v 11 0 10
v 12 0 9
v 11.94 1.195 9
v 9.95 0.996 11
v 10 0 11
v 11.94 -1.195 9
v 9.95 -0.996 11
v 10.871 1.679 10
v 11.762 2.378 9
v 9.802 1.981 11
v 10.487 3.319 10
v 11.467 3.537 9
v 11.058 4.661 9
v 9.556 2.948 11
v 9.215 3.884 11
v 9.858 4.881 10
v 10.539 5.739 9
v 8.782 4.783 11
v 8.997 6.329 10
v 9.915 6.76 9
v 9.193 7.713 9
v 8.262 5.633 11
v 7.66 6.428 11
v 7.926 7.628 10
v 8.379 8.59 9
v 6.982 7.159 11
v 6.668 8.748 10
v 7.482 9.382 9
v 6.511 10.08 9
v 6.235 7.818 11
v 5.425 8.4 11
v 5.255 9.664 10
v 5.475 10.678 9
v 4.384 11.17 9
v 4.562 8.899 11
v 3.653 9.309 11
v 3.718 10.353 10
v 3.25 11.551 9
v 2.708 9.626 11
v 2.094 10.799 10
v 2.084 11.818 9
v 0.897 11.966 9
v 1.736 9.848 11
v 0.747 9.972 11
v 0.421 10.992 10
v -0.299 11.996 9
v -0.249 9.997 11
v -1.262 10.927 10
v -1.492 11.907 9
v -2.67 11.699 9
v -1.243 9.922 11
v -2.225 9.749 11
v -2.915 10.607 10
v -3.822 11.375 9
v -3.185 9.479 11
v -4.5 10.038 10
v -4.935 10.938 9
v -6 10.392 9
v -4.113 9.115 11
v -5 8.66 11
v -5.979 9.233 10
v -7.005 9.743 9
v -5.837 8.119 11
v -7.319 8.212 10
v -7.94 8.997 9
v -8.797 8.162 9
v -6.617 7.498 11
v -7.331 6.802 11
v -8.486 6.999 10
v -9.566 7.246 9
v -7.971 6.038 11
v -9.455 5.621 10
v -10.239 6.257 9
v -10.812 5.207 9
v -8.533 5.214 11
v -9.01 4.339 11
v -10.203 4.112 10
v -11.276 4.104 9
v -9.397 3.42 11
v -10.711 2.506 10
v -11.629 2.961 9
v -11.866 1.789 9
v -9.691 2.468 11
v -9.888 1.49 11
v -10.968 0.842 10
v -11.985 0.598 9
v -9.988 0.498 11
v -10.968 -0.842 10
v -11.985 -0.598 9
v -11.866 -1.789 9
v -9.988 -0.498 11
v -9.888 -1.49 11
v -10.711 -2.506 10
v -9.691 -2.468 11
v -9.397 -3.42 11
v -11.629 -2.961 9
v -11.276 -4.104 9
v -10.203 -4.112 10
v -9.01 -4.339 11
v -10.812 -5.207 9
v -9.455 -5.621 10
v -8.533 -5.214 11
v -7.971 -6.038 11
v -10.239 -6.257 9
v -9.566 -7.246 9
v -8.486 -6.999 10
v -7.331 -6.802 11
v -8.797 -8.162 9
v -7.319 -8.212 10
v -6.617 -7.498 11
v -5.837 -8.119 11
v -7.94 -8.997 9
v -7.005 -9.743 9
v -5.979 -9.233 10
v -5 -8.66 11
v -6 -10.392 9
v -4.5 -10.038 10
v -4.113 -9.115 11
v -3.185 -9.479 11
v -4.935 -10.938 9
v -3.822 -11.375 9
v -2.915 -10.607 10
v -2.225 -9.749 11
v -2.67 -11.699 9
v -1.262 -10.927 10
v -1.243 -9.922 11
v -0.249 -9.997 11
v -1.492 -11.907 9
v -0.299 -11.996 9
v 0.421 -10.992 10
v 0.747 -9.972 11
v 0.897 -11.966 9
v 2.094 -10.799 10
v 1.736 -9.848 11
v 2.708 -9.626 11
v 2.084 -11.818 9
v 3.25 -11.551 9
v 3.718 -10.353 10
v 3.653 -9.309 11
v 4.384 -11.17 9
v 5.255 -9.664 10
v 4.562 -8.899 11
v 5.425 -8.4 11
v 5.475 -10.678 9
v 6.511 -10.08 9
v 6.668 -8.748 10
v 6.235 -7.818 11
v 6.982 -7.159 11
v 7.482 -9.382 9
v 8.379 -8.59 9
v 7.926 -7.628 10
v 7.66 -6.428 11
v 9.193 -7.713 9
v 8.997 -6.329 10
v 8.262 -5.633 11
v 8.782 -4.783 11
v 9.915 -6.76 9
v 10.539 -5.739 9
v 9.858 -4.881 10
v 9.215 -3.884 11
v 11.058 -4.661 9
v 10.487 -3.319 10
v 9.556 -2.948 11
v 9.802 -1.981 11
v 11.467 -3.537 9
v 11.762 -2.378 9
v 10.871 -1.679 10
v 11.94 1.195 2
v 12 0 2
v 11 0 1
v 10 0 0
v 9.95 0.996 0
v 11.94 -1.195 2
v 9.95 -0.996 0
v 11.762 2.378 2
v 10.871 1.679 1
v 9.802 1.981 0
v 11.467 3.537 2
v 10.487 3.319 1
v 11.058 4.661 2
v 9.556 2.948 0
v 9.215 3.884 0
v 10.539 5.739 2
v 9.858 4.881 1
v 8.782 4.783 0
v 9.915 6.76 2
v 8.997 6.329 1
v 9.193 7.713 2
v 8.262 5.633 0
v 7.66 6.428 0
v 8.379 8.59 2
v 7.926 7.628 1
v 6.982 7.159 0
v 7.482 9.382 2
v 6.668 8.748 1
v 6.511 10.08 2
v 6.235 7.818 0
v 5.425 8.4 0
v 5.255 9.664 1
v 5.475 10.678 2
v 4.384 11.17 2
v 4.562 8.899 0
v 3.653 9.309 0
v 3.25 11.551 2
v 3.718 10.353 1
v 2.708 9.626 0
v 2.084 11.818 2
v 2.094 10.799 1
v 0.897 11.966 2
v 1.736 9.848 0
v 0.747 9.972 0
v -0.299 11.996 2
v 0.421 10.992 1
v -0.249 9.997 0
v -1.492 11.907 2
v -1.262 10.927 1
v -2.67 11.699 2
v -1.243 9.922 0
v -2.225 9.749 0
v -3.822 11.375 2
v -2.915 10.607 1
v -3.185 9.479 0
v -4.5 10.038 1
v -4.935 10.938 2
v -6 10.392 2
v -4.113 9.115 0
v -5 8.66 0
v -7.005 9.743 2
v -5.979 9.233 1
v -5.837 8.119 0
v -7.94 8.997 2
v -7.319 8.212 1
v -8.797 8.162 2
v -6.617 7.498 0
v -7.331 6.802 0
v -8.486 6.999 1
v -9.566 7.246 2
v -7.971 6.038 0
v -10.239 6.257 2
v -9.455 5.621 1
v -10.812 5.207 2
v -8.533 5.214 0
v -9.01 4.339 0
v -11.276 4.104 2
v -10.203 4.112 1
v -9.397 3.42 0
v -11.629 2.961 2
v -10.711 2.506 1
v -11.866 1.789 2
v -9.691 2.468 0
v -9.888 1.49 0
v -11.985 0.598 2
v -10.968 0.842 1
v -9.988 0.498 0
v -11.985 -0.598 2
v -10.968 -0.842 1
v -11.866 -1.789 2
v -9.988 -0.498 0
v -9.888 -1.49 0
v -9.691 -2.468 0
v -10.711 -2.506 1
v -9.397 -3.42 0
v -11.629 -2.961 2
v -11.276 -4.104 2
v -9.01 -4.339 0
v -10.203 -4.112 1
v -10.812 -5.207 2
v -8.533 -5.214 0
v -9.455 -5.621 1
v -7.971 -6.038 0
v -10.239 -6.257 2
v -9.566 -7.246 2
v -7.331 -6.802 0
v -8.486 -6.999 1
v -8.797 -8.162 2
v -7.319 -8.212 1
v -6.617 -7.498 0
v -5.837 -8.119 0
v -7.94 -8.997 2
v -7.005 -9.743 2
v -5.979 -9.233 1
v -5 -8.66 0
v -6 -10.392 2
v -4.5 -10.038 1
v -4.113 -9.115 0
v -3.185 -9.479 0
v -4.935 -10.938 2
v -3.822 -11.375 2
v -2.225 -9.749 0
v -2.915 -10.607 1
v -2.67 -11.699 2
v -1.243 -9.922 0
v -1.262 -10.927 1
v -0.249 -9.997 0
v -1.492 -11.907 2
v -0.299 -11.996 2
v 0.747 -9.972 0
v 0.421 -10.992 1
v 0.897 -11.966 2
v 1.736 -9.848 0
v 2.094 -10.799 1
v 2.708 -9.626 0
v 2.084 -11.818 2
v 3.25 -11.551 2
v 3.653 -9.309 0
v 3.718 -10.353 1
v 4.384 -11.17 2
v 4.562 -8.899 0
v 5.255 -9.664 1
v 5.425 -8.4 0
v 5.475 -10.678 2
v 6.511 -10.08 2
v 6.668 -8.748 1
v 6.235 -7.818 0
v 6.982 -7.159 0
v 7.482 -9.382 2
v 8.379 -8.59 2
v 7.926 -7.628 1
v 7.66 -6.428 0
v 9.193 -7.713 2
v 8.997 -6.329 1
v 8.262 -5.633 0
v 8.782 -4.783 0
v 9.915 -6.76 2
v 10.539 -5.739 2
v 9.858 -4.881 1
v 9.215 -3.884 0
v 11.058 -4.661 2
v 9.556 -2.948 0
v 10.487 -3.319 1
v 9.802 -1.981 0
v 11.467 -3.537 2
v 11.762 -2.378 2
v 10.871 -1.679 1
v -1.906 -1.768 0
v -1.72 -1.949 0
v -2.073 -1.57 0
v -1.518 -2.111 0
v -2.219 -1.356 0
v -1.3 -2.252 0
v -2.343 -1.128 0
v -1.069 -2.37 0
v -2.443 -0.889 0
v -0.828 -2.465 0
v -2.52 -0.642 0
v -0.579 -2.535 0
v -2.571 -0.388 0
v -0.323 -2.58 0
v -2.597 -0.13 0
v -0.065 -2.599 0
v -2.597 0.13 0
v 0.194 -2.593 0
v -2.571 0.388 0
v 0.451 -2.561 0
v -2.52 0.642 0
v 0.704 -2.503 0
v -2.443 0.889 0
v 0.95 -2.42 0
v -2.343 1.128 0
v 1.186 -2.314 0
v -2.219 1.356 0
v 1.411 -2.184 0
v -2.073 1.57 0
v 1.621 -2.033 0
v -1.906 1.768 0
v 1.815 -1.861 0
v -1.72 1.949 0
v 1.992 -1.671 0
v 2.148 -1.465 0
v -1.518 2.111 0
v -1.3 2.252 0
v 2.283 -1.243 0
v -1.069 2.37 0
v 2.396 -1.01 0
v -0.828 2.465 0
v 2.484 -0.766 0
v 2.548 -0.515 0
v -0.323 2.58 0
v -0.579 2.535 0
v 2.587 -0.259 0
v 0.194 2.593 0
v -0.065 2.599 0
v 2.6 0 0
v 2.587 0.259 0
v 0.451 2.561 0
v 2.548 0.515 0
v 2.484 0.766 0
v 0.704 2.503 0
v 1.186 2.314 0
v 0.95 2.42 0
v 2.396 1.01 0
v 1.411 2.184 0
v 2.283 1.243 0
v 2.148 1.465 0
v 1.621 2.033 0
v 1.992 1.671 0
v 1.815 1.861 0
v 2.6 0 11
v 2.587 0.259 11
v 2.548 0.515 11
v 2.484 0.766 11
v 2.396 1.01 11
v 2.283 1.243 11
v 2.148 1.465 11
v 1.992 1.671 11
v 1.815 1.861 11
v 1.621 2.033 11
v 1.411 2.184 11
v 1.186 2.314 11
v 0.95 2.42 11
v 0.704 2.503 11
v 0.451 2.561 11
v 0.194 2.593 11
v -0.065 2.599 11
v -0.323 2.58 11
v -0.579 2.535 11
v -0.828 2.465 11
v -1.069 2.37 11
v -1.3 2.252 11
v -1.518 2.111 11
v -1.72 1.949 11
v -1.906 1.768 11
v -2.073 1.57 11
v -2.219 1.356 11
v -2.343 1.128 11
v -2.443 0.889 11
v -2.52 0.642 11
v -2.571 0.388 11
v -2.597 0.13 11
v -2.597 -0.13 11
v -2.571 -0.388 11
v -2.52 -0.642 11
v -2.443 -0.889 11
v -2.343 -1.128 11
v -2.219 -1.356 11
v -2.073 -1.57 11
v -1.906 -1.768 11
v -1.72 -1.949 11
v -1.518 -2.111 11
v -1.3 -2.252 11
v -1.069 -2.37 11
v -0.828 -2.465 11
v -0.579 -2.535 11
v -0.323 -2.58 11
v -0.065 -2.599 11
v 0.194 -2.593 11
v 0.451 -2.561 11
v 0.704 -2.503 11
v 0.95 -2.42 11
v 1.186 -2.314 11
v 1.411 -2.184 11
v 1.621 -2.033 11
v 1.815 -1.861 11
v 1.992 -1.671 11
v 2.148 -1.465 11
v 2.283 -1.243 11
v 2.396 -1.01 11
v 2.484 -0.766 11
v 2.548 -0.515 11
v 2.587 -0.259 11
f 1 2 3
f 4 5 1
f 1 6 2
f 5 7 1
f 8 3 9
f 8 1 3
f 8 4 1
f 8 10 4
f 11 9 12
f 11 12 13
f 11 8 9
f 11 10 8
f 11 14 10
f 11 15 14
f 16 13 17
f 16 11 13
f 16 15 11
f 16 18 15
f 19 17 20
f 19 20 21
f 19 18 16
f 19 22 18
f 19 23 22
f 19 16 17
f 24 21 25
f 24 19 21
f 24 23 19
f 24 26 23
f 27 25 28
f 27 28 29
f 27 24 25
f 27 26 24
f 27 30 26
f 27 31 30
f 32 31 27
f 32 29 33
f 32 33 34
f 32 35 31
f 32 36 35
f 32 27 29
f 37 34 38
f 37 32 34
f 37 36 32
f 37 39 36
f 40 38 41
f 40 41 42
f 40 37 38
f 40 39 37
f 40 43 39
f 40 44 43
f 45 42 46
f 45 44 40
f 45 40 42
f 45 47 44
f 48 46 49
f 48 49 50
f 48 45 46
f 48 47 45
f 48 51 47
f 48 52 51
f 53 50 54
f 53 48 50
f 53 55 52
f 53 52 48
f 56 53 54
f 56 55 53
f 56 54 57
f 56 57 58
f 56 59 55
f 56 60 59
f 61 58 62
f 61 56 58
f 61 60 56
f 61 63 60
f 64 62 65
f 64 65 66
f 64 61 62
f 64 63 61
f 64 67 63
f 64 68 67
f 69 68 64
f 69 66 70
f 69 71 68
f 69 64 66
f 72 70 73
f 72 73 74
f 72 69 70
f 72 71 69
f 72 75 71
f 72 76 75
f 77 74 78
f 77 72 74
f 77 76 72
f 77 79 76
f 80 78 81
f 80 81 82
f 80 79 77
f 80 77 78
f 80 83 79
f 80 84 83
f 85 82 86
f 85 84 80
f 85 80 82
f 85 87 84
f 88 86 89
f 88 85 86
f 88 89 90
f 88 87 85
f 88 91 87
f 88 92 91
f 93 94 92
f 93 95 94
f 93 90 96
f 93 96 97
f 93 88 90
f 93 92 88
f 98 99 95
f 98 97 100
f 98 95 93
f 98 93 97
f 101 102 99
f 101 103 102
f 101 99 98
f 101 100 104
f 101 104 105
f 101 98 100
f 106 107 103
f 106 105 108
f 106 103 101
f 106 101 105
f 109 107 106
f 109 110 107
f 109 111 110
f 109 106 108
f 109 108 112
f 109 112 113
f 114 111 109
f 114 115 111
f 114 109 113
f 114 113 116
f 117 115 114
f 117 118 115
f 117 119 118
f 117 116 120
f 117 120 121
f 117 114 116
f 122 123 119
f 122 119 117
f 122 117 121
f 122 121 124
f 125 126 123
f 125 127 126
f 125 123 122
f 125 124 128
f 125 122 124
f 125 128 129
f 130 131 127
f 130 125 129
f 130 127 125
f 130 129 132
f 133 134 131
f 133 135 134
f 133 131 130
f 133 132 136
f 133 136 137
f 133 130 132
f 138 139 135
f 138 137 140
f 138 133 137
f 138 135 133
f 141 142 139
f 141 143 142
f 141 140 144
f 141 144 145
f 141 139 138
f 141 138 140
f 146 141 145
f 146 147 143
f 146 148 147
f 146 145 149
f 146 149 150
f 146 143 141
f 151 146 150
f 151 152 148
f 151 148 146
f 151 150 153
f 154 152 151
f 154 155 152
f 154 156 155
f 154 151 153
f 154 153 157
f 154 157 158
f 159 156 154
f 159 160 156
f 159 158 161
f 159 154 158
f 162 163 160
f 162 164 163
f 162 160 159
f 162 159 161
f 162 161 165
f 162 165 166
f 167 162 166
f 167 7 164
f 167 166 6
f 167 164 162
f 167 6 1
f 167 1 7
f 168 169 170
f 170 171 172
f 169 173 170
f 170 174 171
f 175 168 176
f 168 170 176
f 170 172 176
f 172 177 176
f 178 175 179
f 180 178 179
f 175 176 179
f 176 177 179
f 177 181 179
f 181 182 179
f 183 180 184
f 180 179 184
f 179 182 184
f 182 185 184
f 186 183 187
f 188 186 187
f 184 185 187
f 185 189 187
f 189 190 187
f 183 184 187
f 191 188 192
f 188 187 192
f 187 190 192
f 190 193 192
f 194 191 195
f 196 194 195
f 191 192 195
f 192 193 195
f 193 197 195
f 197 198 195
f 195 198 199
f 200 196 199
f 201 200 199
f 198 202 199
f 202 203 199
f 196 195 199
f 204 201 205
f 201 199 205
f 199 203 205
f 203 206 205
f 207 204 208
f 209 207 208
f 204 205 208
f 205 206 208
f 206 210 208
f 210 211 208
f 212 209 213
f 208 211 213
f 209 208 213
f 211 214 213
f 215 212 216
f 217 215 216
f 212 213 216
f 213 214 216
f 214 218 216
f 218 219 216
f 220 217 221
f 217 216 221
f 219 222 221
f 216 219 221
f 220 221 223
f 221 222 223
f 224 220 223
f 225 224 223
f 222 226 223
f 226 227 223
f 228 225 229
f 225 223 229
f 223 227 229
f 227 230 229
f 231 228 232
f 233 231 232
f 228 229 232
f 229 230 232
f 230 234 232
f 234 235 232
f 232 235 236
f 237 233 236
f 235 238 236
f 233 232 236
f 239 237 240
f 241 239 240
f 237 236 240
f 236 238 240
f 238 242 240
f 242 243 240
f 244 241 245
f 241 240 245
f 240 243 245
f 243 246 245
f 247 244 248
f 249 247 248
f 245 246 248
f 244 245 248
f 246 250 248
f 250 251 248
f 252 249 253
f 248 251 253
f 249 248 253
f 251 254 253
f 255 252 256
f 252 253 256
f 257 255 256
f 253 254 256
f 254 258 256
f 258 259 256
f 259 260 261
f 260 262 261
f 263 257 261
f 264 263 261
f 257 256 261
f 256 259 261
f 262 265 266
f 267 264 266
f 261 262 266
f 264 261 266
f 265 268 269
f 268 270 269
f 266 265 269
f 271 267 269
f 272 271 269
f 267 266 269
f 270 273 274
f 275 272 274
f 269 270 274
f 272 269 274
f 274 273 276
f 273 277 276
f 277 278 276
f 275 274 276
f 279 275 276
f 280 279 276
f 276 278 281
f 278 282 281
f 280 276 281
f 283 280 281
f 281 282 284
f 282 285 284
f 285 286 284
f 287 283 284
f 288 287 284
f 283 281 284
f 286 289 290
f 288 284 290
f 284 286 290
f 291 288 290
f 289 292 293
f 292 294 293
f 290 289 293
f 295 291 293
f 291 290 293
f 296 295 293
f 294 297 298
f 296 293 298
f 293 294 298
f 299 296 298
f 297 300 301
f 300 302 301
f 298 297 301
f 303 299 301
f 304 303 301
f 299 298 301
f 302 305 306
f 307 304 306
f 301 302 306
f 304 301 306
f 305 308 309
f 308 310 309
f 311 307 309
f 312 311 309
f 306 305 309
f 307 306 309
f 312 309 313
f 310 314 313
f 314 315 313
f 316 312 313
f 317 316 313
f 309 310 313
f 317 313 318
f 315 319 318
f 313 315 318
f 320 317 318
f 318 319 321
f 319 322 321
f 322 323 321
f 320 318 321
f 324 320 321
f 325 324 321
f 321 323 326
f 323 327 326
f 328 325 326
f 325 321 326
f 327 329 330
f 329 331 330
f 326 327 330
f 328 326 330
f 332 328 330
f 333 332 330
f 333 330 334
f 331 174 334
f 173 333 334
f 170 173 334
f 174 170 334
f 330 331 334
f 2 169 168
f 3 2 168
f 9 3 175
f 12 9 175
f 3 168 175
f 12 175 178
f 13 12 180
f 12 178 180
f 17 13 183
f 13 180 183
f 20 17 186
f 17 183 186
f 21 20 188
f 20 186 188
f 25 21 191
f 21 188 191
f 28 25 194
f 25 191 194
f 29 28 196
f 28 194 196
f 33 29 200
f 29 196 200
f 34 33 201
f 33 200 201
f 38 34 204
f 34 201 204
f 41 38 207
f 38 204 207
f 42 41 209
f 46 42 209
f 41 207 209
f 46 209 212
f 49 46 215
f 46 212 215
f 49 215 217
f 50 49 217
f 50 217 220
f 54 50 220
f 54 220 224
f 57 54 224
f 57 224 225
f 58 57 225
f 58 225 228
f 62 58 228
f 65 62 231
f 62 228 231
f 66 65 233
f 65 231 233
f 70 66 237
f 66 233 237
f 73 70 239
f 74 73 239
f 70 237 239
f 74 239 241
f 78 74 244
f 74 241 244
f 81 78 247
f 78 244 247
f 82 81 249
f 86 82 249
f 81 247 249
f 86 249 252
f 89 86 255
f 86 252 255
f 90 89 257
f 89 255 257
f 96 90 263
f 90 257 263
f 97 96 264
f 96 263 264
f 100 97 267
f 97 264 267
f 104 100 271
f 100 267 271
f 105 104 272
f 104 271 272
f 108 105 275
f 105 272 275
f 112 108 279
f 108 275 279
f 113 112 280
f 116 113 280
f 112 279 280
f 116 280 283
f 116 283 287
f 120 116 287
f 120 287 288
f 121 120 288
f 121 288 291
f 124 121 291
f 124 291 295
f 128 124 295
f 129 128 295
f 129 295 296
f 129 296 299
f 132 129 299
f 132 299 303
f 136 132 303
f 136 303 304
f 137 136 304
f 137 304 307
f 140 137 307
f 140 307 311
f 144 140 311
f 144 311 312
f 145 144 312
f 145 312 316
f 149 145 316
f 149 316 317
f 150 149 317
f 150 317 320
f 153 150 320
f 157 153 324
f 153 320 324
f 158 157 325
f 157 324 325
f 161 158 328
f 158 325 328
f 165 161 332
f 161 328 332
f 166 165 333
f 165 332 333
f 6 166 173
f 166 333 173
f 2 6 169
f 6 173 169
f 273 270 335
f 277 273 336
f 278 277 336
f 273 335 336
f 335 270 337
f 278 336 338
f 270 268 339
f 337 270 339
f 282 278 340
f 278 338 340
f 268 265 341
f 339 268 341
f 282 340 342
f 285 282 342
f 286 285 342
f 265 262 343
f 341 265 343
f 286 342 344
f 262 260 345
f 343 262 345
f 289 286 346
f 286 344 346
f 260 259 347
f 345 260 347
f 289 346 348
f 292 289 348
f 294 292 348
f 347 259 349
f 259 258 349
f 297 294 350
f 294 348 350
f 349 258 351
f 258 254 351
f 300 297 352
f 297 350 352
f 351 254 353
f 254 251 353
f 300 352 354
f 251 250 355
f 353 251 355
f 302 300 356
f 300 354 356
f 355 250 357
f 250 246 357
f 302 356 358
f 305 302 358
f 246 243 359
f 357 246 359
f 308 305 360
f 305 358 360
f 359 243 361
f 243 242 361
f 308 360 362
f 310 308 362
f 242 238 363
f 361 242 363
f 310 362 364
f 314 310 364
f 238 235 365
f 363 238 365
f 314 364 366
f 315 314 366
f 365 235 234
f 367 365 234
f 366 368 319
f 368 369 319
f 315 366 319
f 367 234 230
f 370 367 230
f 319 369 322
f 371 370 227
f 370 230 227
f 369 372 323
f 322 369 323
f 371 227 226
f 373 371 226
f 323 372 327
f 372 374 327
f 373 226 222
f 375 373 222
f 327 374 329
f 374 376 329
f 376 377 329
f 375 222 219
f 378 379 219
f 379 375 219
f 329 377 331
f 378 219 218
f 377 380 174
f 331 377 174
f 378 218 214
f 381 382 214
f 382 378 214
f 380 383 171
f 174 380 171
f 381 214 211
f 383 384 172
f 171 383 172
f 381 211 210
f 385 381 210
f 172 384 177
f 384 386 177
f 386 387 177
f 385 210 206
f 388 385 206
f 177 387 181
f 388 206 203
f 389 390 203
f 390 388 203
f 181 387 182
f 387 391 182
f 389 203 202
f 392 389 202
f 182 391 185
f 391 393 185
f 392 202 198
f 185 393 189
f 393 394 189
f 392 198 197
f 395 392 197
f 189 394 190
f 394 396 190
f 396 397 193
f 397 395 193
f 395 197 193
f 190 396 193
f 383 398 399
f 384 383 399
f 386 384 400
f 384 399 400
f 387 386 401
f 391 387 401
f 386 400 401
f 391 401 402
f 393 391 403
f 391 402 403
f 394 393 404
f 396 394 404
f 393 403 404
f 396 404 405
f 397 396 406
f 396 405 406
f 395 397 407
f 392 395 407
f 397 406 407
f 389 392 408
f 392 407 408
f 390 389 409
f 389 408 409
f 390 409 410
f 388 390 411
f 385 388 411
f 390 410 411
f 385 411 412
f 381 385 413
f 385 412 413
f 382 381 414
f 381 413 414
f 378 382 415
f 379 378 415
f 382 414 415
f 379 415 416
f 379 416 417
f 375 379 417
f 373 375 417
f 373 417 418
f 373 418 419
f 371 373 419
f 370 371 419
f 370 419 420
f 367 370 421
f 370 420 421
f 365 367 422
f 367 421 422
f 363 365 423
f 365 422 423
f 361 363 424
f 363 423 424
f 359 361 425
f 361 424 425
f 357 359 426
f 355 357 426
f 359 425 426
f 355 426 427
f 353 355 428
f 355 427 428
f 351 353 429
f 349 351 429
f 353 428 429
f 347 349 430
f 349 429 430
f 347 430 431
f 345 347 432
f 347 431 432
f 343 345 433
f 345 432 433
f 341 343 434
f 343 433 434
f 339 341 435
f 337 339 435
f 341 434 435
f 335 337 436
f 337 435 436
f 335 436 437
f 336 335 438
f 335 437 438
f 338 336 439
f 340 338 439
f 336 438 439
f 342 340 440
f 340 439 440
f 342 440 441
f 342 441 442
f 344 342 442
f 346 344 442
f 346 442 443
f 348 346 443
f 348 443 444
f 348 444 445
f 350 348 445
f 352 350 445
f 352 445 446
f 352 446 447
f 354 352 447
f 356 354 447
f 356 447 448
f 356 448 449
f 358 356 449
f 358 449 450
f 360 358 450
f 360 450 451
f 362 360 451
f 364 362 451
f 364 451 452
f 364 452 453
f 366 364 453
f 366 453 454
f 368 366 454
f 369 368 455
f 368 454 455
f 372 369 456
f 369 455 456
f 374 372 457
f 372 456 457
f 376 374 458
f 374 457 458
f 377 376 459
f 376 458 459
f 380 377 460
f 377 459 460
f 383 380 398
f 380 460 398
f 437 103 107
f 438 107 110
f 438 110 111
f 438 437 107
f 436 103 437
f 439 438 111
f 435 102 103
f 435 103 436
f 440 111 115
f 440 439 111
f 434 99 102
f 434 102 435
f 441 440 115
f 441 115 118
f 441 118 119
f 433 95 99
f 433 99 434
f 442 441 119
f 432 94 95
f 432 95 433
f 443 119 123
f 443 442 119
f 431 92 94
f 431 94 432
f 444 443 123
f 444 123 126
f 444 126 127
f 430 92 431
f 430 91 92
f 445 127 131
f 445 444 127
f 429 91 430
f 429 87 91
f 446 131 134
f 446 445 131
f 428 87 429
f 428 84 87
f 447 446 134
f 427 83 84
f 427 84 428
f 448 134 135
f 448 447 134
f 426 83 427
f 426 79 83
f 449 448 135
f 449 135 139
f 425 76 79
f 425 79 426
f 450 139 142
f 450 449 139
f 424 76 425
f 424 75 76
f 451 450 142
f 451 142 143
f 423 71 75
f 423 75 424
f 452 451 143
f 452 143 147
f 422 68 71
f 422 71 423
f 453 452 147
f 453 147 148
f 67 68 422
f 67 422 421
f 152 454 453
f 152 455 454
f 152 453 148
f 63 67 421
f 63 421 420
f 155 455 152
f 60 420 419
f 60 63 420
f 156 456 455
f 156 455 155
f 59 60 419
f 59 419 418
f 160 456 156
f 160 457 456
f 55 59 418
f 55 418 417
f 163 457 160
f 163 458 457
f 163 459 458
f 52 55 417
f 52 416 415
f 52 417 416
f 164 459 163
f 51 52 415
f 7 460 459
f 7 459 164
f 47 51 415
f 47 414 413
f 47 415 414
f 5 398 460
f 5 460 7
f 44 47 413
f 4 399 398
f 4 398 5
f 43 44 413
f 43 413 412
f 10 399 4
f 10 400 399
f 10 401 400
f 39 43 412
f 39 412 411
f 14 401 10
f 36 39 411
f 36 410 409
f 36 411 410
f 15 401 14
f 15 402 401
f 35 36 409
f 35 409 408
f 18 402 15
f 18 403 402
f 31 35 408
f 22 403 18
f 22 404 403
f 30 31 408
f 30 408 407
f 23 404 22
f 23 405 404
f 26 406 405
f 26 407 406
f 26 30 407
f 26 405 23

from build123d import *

# Parameters (mm, degrees)
SKETCH1_R           = 12
BOSS_EXTRUDE1_DEPTH = 11
CHAMFER1_SIZE       = 2
SKETCH2_R           = 2.6
CUT_EXTRUDE1_DEPTH  = 11


with BuildPart() as part:
    # Sketch1 → Boss-Extrude1 (new body)
    with BuildSketch(Plane.XY):
        Circle(SKETCH1_R)
    extrude(amount=BOSS_EXTRUDE1_DEPTH)

    # Chamfer1
    chamfer1_edges = [part.edges().sort_by_distance(p)[0] for p in [
        (-12, 0, 0),
        (-12, 0, 11),
    ]]
    chamfer(chamfer1_edges, length=CHAMFER1_SIZE)

    # Sketch2 → Cut-Extrude1 (cut)
    with BuildSketch(Plane.XY.offset(11)):
        Circle(SKETCH2_R)
    extrude(amount=-CUT_EXTRUDE1_DEPTH, mode=Mode.SUBTRACT)


solid = part.part
